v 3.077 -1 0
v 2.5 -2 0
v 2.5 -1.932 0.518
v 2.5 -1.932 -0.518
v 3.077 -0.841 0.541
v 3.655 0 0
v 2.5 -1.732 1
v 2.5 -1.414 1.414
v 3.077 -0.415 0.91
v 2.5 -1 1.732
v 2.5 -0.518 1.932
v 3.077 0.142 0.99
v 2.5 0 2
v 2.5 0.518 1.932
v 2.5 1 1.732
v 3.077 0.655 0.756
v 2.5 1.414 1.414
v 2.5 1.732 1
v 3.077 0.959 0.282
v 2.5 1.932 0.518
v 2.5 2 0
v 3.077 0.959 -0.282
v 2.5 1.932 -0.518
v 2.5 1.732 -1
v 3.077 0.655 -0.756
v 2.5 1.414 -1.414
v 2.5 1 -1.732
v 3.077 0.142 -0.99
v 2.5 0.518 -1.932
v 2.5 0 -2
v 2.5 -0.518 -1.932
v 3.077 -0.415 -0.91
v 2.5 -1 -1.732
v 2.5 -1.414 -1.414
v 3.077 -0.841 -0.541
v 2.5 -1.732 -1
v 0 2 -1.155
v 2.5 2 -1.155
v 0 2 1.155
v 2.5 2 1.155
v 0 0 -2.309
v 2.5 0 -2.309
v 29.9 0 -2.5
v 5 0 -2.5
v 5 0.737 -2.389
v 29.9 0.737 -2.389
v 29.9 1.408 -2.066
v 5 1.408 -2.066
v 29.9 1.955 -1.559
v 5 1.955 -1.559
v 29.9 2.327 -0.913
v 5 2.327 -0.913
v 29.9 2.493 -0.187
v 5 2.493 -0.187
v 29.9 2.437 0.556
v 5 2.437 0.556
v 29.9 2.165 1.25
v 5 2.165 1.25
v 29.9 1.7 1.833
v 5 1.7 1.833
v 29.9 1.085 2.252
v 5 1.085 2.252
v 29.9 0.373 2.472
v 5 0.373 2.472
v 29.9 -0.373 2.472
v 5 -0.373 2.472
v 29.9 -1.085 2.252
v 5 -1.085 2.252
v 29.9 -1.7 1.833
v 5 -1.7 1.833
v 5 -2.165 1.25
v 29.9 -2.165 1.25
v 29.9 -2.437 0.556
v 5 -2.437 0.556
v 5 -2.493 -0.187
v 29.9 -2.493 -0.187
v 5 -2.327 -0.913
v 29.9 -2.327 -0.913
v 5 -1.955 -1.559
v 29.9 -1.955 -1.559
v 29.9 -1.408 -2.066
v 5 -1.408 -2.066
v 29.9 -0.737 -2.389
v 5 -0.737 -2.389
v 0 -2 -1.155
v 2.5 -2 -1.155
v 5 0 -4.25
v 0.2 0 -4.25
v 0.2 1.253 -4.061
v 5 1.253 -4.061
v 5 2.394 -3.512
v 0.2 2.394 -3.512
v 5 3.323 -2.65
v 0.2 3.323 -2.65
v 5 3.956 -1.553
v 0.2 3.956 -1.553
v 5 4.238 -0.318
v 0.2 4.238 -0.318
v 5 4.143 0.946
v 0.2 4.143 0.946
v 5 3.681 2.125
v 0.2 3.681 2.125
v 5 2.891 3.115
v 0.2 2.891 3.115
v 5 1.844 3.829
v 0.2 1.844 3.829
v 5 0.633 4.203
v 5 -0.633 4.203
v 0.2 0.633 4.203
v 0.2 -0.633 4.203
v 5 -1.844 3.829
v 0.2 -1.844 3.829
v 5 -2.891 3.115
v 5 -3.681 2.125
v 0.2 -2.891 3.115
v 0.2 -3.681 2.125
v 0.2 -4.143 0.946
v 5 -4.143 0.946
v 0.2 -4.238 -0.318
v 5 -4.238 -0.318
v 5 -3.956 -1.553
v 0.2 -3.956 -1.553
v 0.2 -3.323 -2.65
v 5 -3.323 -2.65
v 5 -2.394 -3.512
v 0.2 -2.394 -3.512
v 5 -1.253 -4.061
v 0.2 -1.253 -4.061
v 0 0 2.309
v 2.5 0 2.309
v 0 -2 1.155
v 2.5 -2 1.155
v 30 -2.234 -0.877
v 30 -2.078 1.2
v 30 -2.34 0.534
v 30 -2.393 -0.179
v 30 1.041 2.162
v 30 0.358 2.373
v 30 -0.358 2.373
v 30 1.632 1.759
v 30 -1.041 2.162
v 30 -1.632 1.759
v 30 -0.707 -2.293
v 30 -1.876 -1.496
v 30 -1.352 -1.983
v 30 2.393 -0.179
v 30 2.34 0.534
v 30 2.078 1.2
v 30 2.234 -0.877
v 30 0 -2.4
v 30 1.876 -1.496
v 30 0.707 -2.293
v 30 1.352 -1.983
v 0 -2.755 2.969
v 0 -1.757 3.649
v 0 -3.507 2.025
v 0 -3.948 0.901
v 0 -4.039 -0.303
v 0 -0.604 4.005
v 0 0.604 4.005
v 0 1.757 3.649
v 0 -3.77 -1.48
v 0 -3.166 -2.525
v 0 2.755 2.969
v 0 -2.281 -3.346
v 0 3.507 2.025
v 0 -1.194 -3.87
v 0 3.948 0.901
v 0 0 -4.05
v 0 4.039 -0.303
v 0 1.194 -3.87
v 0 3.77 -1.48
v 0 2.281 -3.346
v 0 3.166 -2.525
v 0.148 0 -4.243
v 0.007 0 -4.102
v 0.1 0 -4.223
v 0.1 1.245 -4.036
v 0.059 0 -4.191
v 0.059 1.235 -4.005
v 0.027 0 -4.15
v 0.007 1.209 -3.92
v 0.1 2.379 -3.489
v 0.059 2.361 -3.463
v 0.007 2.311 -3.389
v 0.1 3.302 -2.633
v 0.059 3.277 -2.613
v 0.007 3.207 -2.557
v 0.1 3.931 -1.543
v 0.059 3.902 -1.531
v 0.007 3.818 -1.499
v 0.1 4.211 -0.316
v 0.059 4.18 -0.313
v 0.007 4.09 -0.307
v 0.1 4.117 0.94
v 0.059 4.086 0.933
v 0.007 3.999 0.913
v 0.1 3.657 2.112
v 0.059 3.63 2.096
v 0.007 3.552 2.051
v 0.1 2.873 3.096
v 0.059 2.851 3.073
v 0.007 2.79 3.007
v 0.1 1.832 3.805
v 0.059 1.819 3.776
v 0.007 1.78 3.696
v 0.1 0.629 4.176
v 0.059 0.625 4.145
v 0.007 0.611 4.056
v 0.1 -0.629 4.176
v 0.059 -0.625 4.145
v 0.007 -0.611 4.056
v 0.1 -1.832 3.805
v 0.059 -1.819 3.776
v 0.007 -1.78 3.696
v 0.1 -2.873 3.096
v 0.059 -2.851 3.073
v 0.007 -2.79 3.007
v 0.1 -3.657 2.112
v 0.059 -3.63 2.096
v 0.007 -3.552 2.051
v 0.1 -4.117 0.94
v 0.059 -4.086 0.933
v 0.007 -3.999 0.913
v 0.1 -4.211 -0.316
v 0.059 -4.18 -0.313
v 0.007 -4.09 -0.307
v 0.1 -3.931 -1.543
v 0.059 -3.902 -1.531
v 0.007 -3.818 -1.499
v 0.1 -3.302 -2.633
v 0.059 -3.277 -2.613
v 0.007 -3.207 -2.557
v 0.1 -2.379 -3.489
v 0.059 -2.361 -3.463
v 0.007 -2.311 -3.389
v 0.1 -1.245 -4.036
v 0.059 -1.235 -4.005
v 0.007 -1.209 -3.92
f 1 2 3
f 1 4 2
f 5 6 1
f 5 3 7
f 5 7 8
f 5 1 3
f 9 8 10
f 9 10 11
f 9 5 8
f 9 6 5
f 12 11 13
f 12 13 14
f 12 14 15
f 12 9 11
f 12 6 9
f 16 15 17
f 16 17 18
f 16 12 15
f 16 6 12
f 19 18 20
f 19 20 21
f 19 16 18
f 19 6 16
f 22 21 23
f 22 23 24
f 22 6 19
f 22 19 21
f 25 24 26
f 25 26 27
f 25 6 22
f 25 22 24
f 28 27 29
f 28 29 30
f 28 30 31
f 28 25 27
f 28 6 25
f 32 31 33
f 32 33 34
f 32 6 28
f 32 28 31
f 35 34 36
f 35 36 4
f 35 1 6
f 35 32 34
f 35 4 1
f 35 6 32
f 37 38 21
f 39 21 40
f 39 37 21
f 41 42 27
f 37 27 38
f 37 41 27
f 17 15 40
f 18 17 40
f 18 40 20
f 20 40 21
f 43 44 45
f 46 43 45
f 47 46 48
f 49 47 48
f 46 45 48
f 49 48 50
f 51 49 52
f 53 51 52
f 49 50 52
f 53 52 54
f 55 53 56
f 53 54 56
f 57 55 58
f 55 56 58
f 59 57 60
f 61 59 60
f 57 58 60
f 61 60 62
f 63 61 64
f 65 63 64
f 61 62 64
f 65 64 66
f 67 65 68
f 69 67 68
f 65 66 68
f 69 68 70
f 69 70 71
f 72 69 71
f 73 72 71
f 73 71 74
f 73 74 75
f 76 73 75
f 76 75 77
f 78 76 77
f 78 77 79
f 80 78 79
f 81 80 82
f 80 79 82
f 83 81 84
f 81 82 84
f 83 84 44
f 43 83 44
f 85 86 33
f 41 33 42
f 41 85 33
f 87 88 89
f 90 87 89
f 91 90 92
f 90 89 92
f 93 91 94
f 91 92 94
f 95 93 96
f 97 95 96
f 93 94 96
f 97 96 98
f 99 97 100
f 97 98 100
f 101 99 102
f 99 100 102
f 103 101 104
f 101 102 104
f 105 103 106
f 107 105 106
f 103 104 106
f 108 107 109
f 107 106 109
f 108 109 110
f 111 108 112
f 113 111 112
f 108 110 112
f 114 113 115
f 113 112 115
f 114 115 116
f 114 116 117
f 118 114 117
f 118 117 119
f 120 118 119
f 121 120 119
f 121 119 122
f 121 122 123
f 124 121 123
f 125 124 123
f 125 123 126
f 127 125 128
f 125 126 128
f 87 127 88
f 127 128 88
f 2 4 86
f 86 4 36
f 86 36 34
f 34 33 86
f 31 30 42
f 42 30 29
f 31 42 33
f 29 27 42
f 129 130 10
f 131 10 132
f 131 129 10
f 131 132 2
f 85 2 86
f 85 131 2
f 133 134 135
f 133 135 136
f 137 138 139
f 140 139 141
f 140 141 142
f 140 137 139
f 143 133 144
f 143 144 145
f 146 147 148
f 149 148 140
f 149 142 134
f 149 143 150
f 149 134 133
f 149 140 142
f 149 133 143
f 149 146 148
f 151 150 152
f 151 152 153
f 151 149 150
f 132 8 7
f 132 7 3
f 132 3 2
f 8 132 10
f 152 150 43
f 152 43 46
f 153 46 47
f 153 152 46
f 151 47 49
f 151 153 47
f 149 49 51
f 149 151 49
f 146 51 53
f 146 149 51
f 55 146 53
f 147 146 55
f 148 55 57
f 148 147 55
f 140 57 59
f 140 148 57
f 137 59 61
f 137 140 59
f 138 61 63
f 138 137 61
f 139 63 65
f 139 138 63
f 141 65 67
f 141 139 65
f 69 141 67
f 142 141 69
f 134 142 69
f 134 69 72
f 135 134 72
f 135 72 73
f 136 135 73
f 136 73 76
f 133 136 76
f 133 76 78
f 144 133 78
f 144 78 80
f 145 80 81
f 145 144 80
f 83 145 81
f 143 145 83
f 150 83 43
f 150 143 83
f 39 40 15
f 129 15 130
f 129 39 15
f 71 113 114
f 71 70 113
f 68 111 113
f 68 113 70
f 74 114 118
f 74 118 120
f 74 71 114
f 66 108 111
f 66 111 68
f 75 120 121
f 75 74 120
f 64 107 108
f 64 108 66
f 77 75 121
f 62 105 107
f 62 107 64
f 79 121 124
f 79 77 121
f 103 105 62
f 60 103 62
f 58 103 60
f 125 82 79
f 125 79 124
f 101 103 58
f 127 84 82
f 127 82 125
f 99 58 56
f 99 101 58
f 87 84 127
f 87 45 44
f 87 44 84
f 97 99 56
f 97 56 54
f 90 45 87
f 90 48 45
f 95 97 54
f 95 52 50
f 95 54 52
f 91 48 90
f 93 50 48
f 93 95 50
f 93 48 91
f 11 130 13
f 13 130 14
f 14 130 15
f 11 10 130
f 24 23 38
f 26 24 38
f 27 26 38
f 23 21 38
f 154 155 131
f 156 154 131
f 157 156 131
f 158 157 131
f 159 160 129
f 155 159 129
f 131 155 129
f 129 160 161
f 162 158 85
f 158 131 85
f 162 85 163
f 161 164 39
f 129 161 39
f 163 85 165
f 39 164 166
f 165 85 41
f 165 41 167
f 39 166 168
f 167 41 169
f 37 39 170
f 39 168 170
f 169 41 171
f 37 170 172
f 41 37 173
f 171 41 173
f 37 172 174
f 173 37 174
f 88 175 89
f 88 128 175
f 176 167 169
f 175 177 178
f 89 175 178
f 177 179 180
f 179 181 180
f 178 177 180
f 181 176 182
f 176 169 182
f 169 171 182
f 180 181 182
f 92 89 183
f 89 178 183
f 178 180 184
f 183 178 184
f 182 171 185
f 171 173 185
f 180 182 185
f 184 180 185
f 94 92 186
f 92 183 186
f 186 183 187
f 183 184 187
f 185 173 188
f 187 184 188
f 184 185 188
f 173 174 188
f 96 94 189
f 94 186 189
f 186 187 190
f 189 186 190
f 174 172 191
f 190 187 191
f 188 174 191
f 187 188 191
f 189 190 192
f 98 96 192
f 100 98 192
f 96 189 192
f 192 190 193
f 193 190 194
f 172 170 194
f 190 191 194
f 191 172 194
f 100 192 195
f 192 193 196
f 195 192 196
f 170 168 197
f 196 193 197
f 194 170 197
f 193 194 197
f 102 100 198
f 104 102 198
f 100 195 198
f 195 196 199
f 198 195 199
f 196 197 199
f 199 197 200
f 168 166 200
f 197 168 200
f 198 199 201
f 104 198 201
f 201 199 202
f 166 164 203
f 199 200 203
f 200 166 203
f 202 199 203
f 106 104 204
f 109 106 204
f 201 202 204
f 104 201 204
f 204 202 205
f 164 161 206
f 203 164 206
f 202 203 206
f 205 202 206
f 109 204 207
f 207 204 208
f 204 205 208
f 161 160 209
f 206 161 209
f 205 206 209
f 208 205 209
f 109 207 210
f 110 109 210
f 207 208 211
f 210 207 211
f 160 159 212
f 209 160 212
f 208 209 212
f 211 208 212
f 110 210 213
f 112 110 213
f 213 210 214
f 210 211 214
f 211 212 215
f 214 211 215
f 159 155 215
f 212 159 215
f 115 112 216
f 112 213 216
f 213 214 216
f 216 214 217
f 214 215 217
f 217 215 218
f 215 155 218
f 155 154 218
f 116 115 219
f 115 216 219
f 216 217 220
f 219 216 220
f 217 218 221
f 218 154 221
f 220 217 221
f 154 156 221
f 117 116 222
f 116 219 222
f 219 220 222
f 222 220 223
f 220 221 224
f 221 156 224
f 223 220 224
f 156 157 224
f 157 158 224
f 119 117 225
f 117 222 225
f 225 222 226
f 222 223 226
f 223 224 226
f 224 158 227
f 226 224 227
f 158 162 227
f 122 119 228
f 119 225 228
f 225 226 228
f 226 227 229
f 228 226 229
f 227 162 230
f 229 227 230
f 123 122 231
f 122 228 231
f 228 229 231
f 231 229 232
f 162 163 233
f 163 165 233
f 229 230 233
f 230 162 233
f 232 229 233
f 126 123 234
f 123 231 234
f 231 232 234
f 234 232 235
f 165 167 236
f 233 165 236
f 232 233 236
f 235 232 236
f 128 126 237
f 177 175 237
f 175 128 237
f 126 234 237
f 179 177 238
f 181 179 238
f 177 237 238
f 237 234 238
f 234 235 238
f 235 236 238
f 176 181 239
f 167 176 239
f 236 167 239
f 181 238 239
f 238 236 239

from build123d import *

# Parameters (mm, degrees)
SKETCH1_R           = 4.25
BASEHEAD_DEPTH      = 5
SKETCH2_R           = 2.5
BASEBODY_DEPTH      = 25
HEXAGONSOCKET_DEPTH = 2.5
TOPFILLET_R         = 0.2
CHAMFER1_SIZE       = 0.1


with BuildPart() as part:
    # Sketch1 → BaseHead (new body)
    with BuildSketch(Plane(origin=(0, 0, 0), x_dir=(0, 0, -1), z_dir=(1, 0, 0))):
        Circle(SKETCH1_R)
    extrude(amount=BASEHEAD_DEPTH)

    # Sketch2 → BaseBody (add)
    with BuildSketch(Plane(origin=(5, 0, 0), x_dir=(0, 0, -1), z_dir=(1, 0, 0))):
        Circle(SKETCH2_R)
    extrude(amount=BASEBODY_DEPTH)

    # Sketch3 → HexagonSocket (cut)
    with BuildSketch(Plane(origin=(0, 0, 0), x_dir=(0, 0, -1), z_dir=(1, 0, 0))):
        Polygon((2.309401077, 0), (1.154700538, 2), (-1.154700538, 2), (-2.309401077, 0), (-1.154700538, -2), (1.154700538, -2), align=None)
    extrude(amount=HEXAGONSOCKET_DEPTH, mode=Mode.SUBTRACT)

    # Sketch4 → Cut-Revolve1 (revolve, cut)
    with BuildSketch(Plane(origin=(-4.19613823, 0.75, 0), x_dir=(-1, 0, 0), z_dir=(0, 0, 1))):
        Polygon((-6.69613823, 2.75), (-7.850838768, 0.75), (-6.69613823, 0.75), align=None)
    revolve(axis=Axis((0.838992387, 0, 0), (-1, 0, 0)), mode=Mode.SUBTRACT)

    # TopFillet
    topfillet_edges = [part.edges().sort_by_distance(p)[0] for p in [
        (0, 0, 4.25),
    ]]
    fillet(topfillet_edges, radius=TOPFILLET_R)

    # Chamfer1
    chamfer1_edges = [part.edges().sort_by_distance(p)[0] for p in [
        (30, 0, 2.5),
    ]]
    chamfer(chamfer1_edges, length=CHAMFER1_SIZE)


solid = part.part
